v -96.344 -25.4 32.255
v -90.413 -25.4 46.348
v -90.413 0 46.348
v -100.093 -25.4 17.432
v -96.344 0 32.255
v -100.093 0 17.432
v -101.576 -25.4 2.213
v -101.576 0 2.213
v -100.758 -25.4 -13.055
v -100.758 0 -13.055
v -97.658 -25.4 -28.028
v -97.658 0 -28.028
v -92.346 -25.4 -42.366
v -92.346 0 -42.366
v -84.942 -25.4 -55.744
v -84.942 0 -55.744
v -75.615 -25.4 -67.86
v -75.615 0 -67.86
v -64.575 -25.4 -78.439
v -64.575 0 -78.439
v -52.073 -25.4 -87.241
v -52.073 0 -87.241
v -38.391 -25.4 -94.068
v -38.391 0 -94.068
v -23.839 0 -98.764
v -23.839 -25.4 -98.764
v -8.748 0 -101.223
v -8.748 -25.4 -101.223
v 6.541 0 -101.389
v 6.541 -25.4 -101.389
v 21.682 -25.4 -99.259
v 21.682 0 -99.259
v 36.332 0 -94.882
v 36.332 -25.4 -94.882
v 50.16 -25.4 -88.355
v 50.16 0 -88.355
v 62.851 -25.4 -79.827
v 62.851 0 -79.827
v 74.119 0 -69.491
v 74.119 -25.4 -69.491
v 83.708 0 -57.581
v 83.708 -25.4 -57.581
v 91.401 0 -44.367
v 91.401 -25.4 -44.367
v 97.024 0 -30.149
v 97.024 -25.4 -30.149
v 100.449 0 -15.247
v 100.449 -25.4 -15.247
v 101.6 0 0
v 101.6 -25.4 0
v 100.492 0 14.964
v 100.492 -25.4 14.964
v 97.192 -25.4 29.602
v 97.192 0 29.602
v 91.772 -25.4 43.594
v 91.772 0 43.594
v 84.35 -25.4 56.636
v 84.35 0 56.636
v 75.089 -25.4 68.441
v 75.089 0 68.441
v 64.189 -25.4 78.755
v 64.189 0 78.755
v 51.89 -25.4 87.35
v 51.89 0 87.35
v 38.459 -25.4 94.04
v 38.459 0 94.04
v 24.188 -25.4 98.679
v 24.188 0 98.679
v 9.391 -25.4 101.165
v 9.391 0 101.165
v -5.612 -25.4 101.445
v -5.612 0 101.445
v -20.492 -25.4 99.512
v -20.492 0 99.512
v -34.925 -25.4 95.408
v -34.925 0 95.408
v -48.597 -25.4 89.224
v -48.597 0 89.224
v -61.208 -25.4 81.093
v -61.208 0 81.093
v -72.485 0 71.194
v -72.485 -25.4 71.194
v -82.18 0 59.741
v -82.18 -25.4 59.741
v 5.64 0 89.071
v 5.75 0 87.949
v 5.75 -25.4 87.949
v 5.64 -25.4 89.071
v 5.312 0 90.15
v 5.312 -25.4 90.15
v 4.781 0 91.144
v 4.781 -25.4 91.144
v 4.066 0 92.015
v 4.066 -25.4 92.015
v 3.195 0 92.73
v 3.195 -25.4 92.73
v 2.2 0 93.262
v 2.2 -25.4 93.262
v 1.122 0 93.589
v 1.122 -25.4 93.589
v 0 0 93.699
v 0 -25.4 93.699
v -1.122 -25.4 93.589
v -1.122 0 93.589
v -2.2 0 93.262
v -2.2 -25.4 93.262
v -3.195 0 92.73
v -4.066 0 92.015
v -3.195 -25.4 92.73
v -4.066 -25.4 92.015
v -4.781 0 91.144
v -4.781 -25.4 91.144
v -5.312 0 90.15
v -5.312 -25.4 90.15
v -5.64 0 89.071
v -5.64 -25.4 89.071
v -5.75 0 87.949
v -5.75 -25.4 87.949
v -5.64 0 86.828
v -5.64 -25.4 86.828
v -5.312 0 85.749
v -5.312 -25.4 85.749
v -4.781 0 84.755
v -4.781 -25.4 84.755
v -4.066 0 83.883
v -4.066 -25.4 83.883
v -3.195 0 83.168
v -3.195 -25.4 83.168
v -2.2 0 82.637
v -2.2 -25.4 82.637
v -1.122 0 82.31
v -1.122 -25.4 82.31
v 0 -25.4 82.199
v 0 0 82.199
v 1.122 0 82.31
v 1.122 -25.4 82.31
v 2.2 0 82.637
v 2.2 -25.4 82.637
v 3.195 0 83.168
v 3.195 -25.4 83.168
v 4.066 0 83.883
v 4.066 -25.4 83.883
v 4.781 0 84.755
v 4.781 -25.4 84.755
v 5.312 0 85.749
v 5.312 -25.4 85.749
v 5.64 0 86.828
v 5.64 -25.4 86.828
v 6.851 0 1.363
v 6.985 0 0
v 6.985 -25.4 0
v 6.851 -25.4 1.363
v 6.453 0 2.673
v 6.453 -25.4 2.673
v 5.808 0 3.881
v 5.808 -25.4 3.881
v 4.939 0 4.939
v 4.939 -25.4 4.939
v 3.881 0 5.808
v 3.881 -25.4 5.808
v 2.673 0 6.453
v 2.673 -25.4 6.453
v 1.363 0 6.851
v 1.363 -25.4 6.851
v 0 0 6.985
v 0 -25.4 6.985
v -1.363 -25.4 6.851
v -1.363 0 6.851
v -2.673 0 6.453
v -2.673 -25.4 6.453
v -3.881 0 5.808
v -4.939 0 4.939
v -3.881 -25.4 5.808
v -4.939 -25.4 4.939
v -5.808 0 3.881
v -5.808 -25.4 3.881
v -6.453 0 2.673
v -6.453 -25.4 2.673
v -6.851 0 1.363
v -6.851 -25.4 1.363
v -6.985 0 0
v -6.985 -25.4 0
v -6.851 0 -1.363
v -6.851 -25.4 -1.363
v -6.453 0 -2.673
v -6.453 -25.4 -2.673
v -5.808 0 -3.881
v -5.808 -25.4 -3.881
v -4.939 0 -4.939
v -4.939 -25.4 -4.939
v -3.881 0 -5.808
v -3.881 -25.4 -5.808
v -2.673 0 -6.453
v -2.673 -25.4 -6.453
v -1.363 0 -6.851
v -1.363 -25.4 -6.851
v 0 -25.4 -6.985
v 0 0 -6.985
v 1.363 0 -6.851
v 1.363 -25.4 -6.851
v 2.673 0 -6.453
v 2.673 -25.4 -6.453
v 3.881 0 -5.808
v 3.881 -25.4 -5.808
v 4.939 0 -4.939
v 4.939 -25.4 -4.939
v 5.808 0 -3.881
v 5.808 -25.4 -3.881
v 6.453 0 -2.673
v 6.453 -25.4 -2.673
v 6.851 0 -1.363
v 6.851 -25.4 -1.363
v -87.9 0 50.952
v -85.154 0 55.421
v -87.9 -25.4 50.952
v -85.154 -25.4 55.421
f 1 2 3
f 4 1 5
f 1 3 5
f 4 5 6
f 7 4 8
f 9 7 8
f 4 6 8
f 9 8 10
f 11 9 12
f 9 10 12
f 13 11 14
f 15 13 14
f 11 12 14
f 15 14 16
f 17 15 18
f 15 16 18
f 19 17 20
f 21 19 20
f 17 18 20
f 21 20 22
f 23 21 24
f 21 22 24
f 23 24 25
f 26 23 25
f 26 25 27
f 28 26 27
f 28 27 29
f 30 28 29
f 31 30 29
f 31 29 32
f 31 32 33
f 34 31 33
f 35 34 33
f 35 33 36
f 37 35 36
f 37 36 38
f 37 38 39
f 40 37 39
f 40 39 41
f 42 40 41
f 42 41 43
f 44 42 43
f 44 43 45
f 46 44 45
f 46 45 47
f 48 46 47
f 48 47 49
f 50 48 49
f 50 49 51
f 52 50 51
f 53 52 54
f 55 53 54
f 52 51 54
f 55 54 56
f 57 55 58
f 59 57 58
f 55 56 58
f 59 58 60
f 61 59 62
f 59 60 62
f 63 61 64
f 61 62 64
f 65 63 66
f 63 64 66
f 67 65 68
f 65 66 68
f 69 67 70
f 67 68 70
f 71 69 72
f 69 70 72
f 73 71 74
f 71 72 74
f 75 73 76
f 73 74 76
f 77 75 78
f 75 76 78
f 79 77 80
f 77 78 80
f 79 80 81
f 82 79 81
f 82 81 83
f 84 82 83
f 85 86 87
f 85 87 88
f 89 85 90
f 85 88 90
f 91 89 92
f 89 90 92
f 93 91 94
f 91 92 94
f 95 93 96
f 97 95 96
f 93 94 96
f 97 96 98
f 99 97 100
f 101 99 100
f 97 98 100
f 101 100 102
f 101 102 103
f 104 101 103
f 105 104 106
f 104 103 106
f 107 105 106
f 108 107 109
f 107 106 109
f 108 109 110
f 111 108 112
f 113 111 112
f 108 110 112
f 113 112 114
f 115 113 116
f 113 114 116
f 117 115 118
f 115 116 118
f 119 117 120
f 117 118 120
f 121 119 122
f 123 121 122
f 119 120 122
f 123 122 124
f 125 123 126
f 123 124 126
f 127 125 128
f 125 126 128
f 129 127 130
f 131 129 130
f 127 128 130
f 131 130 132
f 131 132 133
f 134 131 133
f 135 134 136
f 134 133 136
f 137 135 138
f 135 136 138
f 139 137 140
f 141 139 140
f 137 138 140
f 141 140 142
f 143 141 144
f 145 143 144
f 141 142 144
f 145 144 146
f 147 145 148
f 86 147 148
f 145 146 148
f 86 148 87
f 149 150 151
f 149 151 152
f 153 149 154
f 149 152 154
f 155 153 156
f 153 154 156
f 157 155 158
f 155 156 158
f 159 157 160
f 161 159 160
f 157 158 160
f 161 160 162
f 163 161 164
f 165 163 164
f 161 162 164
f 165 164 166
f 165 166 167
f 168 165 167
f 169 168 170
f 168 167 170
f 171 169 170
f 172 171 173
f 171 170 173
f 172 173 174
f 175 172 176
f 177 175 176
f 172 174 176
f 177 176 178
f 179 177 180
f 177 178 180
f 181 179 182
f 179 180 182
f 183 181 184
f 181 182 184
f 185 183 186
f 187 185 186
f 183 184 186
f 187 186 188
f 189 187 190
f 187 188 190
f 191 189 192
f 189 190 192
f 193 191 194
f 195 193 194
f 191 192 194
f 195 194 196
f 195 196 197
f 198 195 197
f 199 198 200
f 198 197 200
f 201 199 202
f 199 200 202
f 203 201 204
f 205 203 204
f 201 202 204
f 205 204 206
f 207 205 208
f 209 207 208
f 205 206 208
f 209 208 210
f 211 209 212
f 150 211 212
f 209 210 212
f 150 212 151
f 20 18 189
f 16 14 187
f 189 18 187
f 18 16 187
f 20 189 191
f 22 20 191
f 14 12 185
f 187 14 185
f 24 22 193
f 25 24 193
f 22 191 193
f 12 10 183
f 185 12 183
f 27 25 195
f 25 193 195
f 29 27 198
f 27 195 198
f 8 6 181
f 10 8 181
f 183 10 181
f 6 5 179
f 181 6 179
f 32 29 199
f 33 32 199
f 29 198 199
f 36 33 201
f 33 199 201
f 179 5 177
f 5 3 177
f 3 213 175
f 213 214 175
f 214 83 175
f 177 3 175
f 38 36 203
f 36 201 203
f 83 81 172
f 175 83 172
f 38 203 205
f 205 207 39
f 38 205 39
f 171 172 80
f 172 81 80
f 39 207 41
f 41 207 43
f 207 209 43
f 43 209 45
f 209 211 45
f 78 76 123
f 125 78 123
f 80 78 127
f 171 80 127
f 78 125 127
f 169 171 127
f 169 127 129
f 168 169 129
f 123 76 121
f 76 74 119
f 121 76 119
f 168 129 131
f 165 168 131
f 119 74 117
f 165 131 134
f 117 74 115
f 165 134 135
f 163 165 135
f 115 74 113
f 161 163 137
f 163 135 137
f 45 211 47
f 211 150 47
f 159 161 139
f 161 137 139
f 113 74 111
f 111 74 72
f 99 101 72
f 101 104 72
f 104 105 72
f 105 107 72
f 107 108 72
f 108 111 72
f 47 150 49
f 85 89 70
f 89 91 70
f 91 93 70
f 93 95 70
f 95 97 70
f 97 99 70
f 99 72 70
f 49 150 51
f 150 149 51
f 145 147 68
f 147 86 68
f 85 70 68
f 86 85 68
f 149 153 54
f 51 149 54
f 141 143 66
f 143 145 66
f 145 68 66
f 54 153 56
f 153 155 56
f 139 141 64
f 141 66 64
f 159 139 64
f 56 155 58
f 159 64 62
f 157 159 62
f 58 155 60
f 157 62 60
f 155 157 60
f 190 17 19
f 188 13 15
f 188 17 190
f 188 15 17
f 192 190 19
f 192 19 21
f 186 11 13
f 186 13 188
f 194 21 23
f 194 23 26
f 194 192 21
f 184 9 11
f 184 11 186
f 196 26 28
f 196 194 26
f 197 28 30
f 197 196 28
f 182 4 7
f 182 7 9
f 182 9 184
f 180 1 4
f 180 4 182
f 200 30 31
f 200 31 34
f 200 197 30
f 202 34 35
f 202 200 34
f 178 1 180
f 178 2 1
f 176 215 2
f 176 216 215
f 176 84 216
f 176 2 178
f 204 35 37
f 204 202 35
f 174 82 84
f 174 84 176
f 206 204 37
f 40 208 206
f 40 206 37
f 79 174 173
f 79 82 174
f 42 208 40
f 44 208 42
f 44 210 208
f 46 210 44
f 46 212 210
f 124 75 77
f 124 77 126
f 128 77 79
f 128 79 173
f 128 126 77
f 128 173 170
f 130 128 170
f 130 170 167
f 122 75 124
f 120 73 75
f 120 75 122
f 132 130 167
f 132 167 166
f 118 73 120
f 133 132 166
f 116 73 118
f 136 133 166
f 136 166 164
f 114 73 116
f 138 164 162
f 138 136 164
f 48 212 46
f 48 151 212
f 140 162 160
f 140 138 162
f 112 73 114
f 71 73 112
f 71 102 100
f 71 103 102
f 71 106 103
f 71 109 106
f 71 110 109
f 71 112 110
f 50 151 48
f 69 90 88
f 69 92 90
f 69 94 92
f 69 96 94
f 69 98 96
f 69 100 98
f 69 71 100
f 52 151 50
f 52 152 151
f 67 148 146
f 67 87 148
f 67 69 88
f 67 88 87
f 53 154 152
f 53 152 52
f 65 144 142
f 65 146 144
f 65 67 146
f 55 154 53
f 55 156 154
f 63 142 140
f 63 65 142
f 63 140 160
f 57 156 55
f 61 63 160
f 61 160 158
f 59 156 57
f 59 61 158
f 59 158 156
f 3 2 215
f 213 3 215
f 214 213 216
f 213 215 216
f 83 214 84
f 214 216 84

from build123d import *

# Parameters (mm, degrees)
F0_R     = 101.6
F1_DEPTH = 25.4
F2_R     = 6.985
F3_DEPTH = 25.4
F5_DEPTH = 25.4
F6_R     = 5.7500810909
F7_DEPTH = 25.4


with BuildPart() as f1:
    # F0 (on Front) → F1 (new body)
    with BuildSketch(Plane.XZ):
        Circle(F0_R)
    extrude(amount=F1_DEPTH)

    # F2 (on face) → F3 (cut)
    with BuildSketch(Plane.XZ.offset(25.4)):
        Circle(F2_R)
    extrude(amount=-F3_DEPTH, mode=Mode.SUBTRACT)

    # F4 (on face) → F5 (cut)
    with BuildSketch(Plane.XZ.offset(25.4)):
        with BuildLine():
            ThreePointArc((-90.4125676958, 46.3478974998), (-86.5556978754, 53.2040521511), (-82.1799387694, 59.7412559615))
            Line((-82.1799387694, 59.7412559615), (-107.8644320369, 59.7412559615))
            Line((-107.8644320369, 59.7412559615), (-107.8644320369, 46.3478974998))
            Line((-107.8644320369, 46.3478974998), (-90.4125676958, 46.3478974998))
        make_face()
    extrude(amount=-F5_DEPTH, mode=Mode.SUBTRACT)

    # F6 (on face) → F7 (cut)
    with BuildSketch(Plane.XZ.offset(25.4)):
        with Locations((0, 87.9493951797)):
            Circle(F6_R)
    extrude(amount=-F7_DEPTH, mode=Mode.SUBTRACT)


solid = f1.part
